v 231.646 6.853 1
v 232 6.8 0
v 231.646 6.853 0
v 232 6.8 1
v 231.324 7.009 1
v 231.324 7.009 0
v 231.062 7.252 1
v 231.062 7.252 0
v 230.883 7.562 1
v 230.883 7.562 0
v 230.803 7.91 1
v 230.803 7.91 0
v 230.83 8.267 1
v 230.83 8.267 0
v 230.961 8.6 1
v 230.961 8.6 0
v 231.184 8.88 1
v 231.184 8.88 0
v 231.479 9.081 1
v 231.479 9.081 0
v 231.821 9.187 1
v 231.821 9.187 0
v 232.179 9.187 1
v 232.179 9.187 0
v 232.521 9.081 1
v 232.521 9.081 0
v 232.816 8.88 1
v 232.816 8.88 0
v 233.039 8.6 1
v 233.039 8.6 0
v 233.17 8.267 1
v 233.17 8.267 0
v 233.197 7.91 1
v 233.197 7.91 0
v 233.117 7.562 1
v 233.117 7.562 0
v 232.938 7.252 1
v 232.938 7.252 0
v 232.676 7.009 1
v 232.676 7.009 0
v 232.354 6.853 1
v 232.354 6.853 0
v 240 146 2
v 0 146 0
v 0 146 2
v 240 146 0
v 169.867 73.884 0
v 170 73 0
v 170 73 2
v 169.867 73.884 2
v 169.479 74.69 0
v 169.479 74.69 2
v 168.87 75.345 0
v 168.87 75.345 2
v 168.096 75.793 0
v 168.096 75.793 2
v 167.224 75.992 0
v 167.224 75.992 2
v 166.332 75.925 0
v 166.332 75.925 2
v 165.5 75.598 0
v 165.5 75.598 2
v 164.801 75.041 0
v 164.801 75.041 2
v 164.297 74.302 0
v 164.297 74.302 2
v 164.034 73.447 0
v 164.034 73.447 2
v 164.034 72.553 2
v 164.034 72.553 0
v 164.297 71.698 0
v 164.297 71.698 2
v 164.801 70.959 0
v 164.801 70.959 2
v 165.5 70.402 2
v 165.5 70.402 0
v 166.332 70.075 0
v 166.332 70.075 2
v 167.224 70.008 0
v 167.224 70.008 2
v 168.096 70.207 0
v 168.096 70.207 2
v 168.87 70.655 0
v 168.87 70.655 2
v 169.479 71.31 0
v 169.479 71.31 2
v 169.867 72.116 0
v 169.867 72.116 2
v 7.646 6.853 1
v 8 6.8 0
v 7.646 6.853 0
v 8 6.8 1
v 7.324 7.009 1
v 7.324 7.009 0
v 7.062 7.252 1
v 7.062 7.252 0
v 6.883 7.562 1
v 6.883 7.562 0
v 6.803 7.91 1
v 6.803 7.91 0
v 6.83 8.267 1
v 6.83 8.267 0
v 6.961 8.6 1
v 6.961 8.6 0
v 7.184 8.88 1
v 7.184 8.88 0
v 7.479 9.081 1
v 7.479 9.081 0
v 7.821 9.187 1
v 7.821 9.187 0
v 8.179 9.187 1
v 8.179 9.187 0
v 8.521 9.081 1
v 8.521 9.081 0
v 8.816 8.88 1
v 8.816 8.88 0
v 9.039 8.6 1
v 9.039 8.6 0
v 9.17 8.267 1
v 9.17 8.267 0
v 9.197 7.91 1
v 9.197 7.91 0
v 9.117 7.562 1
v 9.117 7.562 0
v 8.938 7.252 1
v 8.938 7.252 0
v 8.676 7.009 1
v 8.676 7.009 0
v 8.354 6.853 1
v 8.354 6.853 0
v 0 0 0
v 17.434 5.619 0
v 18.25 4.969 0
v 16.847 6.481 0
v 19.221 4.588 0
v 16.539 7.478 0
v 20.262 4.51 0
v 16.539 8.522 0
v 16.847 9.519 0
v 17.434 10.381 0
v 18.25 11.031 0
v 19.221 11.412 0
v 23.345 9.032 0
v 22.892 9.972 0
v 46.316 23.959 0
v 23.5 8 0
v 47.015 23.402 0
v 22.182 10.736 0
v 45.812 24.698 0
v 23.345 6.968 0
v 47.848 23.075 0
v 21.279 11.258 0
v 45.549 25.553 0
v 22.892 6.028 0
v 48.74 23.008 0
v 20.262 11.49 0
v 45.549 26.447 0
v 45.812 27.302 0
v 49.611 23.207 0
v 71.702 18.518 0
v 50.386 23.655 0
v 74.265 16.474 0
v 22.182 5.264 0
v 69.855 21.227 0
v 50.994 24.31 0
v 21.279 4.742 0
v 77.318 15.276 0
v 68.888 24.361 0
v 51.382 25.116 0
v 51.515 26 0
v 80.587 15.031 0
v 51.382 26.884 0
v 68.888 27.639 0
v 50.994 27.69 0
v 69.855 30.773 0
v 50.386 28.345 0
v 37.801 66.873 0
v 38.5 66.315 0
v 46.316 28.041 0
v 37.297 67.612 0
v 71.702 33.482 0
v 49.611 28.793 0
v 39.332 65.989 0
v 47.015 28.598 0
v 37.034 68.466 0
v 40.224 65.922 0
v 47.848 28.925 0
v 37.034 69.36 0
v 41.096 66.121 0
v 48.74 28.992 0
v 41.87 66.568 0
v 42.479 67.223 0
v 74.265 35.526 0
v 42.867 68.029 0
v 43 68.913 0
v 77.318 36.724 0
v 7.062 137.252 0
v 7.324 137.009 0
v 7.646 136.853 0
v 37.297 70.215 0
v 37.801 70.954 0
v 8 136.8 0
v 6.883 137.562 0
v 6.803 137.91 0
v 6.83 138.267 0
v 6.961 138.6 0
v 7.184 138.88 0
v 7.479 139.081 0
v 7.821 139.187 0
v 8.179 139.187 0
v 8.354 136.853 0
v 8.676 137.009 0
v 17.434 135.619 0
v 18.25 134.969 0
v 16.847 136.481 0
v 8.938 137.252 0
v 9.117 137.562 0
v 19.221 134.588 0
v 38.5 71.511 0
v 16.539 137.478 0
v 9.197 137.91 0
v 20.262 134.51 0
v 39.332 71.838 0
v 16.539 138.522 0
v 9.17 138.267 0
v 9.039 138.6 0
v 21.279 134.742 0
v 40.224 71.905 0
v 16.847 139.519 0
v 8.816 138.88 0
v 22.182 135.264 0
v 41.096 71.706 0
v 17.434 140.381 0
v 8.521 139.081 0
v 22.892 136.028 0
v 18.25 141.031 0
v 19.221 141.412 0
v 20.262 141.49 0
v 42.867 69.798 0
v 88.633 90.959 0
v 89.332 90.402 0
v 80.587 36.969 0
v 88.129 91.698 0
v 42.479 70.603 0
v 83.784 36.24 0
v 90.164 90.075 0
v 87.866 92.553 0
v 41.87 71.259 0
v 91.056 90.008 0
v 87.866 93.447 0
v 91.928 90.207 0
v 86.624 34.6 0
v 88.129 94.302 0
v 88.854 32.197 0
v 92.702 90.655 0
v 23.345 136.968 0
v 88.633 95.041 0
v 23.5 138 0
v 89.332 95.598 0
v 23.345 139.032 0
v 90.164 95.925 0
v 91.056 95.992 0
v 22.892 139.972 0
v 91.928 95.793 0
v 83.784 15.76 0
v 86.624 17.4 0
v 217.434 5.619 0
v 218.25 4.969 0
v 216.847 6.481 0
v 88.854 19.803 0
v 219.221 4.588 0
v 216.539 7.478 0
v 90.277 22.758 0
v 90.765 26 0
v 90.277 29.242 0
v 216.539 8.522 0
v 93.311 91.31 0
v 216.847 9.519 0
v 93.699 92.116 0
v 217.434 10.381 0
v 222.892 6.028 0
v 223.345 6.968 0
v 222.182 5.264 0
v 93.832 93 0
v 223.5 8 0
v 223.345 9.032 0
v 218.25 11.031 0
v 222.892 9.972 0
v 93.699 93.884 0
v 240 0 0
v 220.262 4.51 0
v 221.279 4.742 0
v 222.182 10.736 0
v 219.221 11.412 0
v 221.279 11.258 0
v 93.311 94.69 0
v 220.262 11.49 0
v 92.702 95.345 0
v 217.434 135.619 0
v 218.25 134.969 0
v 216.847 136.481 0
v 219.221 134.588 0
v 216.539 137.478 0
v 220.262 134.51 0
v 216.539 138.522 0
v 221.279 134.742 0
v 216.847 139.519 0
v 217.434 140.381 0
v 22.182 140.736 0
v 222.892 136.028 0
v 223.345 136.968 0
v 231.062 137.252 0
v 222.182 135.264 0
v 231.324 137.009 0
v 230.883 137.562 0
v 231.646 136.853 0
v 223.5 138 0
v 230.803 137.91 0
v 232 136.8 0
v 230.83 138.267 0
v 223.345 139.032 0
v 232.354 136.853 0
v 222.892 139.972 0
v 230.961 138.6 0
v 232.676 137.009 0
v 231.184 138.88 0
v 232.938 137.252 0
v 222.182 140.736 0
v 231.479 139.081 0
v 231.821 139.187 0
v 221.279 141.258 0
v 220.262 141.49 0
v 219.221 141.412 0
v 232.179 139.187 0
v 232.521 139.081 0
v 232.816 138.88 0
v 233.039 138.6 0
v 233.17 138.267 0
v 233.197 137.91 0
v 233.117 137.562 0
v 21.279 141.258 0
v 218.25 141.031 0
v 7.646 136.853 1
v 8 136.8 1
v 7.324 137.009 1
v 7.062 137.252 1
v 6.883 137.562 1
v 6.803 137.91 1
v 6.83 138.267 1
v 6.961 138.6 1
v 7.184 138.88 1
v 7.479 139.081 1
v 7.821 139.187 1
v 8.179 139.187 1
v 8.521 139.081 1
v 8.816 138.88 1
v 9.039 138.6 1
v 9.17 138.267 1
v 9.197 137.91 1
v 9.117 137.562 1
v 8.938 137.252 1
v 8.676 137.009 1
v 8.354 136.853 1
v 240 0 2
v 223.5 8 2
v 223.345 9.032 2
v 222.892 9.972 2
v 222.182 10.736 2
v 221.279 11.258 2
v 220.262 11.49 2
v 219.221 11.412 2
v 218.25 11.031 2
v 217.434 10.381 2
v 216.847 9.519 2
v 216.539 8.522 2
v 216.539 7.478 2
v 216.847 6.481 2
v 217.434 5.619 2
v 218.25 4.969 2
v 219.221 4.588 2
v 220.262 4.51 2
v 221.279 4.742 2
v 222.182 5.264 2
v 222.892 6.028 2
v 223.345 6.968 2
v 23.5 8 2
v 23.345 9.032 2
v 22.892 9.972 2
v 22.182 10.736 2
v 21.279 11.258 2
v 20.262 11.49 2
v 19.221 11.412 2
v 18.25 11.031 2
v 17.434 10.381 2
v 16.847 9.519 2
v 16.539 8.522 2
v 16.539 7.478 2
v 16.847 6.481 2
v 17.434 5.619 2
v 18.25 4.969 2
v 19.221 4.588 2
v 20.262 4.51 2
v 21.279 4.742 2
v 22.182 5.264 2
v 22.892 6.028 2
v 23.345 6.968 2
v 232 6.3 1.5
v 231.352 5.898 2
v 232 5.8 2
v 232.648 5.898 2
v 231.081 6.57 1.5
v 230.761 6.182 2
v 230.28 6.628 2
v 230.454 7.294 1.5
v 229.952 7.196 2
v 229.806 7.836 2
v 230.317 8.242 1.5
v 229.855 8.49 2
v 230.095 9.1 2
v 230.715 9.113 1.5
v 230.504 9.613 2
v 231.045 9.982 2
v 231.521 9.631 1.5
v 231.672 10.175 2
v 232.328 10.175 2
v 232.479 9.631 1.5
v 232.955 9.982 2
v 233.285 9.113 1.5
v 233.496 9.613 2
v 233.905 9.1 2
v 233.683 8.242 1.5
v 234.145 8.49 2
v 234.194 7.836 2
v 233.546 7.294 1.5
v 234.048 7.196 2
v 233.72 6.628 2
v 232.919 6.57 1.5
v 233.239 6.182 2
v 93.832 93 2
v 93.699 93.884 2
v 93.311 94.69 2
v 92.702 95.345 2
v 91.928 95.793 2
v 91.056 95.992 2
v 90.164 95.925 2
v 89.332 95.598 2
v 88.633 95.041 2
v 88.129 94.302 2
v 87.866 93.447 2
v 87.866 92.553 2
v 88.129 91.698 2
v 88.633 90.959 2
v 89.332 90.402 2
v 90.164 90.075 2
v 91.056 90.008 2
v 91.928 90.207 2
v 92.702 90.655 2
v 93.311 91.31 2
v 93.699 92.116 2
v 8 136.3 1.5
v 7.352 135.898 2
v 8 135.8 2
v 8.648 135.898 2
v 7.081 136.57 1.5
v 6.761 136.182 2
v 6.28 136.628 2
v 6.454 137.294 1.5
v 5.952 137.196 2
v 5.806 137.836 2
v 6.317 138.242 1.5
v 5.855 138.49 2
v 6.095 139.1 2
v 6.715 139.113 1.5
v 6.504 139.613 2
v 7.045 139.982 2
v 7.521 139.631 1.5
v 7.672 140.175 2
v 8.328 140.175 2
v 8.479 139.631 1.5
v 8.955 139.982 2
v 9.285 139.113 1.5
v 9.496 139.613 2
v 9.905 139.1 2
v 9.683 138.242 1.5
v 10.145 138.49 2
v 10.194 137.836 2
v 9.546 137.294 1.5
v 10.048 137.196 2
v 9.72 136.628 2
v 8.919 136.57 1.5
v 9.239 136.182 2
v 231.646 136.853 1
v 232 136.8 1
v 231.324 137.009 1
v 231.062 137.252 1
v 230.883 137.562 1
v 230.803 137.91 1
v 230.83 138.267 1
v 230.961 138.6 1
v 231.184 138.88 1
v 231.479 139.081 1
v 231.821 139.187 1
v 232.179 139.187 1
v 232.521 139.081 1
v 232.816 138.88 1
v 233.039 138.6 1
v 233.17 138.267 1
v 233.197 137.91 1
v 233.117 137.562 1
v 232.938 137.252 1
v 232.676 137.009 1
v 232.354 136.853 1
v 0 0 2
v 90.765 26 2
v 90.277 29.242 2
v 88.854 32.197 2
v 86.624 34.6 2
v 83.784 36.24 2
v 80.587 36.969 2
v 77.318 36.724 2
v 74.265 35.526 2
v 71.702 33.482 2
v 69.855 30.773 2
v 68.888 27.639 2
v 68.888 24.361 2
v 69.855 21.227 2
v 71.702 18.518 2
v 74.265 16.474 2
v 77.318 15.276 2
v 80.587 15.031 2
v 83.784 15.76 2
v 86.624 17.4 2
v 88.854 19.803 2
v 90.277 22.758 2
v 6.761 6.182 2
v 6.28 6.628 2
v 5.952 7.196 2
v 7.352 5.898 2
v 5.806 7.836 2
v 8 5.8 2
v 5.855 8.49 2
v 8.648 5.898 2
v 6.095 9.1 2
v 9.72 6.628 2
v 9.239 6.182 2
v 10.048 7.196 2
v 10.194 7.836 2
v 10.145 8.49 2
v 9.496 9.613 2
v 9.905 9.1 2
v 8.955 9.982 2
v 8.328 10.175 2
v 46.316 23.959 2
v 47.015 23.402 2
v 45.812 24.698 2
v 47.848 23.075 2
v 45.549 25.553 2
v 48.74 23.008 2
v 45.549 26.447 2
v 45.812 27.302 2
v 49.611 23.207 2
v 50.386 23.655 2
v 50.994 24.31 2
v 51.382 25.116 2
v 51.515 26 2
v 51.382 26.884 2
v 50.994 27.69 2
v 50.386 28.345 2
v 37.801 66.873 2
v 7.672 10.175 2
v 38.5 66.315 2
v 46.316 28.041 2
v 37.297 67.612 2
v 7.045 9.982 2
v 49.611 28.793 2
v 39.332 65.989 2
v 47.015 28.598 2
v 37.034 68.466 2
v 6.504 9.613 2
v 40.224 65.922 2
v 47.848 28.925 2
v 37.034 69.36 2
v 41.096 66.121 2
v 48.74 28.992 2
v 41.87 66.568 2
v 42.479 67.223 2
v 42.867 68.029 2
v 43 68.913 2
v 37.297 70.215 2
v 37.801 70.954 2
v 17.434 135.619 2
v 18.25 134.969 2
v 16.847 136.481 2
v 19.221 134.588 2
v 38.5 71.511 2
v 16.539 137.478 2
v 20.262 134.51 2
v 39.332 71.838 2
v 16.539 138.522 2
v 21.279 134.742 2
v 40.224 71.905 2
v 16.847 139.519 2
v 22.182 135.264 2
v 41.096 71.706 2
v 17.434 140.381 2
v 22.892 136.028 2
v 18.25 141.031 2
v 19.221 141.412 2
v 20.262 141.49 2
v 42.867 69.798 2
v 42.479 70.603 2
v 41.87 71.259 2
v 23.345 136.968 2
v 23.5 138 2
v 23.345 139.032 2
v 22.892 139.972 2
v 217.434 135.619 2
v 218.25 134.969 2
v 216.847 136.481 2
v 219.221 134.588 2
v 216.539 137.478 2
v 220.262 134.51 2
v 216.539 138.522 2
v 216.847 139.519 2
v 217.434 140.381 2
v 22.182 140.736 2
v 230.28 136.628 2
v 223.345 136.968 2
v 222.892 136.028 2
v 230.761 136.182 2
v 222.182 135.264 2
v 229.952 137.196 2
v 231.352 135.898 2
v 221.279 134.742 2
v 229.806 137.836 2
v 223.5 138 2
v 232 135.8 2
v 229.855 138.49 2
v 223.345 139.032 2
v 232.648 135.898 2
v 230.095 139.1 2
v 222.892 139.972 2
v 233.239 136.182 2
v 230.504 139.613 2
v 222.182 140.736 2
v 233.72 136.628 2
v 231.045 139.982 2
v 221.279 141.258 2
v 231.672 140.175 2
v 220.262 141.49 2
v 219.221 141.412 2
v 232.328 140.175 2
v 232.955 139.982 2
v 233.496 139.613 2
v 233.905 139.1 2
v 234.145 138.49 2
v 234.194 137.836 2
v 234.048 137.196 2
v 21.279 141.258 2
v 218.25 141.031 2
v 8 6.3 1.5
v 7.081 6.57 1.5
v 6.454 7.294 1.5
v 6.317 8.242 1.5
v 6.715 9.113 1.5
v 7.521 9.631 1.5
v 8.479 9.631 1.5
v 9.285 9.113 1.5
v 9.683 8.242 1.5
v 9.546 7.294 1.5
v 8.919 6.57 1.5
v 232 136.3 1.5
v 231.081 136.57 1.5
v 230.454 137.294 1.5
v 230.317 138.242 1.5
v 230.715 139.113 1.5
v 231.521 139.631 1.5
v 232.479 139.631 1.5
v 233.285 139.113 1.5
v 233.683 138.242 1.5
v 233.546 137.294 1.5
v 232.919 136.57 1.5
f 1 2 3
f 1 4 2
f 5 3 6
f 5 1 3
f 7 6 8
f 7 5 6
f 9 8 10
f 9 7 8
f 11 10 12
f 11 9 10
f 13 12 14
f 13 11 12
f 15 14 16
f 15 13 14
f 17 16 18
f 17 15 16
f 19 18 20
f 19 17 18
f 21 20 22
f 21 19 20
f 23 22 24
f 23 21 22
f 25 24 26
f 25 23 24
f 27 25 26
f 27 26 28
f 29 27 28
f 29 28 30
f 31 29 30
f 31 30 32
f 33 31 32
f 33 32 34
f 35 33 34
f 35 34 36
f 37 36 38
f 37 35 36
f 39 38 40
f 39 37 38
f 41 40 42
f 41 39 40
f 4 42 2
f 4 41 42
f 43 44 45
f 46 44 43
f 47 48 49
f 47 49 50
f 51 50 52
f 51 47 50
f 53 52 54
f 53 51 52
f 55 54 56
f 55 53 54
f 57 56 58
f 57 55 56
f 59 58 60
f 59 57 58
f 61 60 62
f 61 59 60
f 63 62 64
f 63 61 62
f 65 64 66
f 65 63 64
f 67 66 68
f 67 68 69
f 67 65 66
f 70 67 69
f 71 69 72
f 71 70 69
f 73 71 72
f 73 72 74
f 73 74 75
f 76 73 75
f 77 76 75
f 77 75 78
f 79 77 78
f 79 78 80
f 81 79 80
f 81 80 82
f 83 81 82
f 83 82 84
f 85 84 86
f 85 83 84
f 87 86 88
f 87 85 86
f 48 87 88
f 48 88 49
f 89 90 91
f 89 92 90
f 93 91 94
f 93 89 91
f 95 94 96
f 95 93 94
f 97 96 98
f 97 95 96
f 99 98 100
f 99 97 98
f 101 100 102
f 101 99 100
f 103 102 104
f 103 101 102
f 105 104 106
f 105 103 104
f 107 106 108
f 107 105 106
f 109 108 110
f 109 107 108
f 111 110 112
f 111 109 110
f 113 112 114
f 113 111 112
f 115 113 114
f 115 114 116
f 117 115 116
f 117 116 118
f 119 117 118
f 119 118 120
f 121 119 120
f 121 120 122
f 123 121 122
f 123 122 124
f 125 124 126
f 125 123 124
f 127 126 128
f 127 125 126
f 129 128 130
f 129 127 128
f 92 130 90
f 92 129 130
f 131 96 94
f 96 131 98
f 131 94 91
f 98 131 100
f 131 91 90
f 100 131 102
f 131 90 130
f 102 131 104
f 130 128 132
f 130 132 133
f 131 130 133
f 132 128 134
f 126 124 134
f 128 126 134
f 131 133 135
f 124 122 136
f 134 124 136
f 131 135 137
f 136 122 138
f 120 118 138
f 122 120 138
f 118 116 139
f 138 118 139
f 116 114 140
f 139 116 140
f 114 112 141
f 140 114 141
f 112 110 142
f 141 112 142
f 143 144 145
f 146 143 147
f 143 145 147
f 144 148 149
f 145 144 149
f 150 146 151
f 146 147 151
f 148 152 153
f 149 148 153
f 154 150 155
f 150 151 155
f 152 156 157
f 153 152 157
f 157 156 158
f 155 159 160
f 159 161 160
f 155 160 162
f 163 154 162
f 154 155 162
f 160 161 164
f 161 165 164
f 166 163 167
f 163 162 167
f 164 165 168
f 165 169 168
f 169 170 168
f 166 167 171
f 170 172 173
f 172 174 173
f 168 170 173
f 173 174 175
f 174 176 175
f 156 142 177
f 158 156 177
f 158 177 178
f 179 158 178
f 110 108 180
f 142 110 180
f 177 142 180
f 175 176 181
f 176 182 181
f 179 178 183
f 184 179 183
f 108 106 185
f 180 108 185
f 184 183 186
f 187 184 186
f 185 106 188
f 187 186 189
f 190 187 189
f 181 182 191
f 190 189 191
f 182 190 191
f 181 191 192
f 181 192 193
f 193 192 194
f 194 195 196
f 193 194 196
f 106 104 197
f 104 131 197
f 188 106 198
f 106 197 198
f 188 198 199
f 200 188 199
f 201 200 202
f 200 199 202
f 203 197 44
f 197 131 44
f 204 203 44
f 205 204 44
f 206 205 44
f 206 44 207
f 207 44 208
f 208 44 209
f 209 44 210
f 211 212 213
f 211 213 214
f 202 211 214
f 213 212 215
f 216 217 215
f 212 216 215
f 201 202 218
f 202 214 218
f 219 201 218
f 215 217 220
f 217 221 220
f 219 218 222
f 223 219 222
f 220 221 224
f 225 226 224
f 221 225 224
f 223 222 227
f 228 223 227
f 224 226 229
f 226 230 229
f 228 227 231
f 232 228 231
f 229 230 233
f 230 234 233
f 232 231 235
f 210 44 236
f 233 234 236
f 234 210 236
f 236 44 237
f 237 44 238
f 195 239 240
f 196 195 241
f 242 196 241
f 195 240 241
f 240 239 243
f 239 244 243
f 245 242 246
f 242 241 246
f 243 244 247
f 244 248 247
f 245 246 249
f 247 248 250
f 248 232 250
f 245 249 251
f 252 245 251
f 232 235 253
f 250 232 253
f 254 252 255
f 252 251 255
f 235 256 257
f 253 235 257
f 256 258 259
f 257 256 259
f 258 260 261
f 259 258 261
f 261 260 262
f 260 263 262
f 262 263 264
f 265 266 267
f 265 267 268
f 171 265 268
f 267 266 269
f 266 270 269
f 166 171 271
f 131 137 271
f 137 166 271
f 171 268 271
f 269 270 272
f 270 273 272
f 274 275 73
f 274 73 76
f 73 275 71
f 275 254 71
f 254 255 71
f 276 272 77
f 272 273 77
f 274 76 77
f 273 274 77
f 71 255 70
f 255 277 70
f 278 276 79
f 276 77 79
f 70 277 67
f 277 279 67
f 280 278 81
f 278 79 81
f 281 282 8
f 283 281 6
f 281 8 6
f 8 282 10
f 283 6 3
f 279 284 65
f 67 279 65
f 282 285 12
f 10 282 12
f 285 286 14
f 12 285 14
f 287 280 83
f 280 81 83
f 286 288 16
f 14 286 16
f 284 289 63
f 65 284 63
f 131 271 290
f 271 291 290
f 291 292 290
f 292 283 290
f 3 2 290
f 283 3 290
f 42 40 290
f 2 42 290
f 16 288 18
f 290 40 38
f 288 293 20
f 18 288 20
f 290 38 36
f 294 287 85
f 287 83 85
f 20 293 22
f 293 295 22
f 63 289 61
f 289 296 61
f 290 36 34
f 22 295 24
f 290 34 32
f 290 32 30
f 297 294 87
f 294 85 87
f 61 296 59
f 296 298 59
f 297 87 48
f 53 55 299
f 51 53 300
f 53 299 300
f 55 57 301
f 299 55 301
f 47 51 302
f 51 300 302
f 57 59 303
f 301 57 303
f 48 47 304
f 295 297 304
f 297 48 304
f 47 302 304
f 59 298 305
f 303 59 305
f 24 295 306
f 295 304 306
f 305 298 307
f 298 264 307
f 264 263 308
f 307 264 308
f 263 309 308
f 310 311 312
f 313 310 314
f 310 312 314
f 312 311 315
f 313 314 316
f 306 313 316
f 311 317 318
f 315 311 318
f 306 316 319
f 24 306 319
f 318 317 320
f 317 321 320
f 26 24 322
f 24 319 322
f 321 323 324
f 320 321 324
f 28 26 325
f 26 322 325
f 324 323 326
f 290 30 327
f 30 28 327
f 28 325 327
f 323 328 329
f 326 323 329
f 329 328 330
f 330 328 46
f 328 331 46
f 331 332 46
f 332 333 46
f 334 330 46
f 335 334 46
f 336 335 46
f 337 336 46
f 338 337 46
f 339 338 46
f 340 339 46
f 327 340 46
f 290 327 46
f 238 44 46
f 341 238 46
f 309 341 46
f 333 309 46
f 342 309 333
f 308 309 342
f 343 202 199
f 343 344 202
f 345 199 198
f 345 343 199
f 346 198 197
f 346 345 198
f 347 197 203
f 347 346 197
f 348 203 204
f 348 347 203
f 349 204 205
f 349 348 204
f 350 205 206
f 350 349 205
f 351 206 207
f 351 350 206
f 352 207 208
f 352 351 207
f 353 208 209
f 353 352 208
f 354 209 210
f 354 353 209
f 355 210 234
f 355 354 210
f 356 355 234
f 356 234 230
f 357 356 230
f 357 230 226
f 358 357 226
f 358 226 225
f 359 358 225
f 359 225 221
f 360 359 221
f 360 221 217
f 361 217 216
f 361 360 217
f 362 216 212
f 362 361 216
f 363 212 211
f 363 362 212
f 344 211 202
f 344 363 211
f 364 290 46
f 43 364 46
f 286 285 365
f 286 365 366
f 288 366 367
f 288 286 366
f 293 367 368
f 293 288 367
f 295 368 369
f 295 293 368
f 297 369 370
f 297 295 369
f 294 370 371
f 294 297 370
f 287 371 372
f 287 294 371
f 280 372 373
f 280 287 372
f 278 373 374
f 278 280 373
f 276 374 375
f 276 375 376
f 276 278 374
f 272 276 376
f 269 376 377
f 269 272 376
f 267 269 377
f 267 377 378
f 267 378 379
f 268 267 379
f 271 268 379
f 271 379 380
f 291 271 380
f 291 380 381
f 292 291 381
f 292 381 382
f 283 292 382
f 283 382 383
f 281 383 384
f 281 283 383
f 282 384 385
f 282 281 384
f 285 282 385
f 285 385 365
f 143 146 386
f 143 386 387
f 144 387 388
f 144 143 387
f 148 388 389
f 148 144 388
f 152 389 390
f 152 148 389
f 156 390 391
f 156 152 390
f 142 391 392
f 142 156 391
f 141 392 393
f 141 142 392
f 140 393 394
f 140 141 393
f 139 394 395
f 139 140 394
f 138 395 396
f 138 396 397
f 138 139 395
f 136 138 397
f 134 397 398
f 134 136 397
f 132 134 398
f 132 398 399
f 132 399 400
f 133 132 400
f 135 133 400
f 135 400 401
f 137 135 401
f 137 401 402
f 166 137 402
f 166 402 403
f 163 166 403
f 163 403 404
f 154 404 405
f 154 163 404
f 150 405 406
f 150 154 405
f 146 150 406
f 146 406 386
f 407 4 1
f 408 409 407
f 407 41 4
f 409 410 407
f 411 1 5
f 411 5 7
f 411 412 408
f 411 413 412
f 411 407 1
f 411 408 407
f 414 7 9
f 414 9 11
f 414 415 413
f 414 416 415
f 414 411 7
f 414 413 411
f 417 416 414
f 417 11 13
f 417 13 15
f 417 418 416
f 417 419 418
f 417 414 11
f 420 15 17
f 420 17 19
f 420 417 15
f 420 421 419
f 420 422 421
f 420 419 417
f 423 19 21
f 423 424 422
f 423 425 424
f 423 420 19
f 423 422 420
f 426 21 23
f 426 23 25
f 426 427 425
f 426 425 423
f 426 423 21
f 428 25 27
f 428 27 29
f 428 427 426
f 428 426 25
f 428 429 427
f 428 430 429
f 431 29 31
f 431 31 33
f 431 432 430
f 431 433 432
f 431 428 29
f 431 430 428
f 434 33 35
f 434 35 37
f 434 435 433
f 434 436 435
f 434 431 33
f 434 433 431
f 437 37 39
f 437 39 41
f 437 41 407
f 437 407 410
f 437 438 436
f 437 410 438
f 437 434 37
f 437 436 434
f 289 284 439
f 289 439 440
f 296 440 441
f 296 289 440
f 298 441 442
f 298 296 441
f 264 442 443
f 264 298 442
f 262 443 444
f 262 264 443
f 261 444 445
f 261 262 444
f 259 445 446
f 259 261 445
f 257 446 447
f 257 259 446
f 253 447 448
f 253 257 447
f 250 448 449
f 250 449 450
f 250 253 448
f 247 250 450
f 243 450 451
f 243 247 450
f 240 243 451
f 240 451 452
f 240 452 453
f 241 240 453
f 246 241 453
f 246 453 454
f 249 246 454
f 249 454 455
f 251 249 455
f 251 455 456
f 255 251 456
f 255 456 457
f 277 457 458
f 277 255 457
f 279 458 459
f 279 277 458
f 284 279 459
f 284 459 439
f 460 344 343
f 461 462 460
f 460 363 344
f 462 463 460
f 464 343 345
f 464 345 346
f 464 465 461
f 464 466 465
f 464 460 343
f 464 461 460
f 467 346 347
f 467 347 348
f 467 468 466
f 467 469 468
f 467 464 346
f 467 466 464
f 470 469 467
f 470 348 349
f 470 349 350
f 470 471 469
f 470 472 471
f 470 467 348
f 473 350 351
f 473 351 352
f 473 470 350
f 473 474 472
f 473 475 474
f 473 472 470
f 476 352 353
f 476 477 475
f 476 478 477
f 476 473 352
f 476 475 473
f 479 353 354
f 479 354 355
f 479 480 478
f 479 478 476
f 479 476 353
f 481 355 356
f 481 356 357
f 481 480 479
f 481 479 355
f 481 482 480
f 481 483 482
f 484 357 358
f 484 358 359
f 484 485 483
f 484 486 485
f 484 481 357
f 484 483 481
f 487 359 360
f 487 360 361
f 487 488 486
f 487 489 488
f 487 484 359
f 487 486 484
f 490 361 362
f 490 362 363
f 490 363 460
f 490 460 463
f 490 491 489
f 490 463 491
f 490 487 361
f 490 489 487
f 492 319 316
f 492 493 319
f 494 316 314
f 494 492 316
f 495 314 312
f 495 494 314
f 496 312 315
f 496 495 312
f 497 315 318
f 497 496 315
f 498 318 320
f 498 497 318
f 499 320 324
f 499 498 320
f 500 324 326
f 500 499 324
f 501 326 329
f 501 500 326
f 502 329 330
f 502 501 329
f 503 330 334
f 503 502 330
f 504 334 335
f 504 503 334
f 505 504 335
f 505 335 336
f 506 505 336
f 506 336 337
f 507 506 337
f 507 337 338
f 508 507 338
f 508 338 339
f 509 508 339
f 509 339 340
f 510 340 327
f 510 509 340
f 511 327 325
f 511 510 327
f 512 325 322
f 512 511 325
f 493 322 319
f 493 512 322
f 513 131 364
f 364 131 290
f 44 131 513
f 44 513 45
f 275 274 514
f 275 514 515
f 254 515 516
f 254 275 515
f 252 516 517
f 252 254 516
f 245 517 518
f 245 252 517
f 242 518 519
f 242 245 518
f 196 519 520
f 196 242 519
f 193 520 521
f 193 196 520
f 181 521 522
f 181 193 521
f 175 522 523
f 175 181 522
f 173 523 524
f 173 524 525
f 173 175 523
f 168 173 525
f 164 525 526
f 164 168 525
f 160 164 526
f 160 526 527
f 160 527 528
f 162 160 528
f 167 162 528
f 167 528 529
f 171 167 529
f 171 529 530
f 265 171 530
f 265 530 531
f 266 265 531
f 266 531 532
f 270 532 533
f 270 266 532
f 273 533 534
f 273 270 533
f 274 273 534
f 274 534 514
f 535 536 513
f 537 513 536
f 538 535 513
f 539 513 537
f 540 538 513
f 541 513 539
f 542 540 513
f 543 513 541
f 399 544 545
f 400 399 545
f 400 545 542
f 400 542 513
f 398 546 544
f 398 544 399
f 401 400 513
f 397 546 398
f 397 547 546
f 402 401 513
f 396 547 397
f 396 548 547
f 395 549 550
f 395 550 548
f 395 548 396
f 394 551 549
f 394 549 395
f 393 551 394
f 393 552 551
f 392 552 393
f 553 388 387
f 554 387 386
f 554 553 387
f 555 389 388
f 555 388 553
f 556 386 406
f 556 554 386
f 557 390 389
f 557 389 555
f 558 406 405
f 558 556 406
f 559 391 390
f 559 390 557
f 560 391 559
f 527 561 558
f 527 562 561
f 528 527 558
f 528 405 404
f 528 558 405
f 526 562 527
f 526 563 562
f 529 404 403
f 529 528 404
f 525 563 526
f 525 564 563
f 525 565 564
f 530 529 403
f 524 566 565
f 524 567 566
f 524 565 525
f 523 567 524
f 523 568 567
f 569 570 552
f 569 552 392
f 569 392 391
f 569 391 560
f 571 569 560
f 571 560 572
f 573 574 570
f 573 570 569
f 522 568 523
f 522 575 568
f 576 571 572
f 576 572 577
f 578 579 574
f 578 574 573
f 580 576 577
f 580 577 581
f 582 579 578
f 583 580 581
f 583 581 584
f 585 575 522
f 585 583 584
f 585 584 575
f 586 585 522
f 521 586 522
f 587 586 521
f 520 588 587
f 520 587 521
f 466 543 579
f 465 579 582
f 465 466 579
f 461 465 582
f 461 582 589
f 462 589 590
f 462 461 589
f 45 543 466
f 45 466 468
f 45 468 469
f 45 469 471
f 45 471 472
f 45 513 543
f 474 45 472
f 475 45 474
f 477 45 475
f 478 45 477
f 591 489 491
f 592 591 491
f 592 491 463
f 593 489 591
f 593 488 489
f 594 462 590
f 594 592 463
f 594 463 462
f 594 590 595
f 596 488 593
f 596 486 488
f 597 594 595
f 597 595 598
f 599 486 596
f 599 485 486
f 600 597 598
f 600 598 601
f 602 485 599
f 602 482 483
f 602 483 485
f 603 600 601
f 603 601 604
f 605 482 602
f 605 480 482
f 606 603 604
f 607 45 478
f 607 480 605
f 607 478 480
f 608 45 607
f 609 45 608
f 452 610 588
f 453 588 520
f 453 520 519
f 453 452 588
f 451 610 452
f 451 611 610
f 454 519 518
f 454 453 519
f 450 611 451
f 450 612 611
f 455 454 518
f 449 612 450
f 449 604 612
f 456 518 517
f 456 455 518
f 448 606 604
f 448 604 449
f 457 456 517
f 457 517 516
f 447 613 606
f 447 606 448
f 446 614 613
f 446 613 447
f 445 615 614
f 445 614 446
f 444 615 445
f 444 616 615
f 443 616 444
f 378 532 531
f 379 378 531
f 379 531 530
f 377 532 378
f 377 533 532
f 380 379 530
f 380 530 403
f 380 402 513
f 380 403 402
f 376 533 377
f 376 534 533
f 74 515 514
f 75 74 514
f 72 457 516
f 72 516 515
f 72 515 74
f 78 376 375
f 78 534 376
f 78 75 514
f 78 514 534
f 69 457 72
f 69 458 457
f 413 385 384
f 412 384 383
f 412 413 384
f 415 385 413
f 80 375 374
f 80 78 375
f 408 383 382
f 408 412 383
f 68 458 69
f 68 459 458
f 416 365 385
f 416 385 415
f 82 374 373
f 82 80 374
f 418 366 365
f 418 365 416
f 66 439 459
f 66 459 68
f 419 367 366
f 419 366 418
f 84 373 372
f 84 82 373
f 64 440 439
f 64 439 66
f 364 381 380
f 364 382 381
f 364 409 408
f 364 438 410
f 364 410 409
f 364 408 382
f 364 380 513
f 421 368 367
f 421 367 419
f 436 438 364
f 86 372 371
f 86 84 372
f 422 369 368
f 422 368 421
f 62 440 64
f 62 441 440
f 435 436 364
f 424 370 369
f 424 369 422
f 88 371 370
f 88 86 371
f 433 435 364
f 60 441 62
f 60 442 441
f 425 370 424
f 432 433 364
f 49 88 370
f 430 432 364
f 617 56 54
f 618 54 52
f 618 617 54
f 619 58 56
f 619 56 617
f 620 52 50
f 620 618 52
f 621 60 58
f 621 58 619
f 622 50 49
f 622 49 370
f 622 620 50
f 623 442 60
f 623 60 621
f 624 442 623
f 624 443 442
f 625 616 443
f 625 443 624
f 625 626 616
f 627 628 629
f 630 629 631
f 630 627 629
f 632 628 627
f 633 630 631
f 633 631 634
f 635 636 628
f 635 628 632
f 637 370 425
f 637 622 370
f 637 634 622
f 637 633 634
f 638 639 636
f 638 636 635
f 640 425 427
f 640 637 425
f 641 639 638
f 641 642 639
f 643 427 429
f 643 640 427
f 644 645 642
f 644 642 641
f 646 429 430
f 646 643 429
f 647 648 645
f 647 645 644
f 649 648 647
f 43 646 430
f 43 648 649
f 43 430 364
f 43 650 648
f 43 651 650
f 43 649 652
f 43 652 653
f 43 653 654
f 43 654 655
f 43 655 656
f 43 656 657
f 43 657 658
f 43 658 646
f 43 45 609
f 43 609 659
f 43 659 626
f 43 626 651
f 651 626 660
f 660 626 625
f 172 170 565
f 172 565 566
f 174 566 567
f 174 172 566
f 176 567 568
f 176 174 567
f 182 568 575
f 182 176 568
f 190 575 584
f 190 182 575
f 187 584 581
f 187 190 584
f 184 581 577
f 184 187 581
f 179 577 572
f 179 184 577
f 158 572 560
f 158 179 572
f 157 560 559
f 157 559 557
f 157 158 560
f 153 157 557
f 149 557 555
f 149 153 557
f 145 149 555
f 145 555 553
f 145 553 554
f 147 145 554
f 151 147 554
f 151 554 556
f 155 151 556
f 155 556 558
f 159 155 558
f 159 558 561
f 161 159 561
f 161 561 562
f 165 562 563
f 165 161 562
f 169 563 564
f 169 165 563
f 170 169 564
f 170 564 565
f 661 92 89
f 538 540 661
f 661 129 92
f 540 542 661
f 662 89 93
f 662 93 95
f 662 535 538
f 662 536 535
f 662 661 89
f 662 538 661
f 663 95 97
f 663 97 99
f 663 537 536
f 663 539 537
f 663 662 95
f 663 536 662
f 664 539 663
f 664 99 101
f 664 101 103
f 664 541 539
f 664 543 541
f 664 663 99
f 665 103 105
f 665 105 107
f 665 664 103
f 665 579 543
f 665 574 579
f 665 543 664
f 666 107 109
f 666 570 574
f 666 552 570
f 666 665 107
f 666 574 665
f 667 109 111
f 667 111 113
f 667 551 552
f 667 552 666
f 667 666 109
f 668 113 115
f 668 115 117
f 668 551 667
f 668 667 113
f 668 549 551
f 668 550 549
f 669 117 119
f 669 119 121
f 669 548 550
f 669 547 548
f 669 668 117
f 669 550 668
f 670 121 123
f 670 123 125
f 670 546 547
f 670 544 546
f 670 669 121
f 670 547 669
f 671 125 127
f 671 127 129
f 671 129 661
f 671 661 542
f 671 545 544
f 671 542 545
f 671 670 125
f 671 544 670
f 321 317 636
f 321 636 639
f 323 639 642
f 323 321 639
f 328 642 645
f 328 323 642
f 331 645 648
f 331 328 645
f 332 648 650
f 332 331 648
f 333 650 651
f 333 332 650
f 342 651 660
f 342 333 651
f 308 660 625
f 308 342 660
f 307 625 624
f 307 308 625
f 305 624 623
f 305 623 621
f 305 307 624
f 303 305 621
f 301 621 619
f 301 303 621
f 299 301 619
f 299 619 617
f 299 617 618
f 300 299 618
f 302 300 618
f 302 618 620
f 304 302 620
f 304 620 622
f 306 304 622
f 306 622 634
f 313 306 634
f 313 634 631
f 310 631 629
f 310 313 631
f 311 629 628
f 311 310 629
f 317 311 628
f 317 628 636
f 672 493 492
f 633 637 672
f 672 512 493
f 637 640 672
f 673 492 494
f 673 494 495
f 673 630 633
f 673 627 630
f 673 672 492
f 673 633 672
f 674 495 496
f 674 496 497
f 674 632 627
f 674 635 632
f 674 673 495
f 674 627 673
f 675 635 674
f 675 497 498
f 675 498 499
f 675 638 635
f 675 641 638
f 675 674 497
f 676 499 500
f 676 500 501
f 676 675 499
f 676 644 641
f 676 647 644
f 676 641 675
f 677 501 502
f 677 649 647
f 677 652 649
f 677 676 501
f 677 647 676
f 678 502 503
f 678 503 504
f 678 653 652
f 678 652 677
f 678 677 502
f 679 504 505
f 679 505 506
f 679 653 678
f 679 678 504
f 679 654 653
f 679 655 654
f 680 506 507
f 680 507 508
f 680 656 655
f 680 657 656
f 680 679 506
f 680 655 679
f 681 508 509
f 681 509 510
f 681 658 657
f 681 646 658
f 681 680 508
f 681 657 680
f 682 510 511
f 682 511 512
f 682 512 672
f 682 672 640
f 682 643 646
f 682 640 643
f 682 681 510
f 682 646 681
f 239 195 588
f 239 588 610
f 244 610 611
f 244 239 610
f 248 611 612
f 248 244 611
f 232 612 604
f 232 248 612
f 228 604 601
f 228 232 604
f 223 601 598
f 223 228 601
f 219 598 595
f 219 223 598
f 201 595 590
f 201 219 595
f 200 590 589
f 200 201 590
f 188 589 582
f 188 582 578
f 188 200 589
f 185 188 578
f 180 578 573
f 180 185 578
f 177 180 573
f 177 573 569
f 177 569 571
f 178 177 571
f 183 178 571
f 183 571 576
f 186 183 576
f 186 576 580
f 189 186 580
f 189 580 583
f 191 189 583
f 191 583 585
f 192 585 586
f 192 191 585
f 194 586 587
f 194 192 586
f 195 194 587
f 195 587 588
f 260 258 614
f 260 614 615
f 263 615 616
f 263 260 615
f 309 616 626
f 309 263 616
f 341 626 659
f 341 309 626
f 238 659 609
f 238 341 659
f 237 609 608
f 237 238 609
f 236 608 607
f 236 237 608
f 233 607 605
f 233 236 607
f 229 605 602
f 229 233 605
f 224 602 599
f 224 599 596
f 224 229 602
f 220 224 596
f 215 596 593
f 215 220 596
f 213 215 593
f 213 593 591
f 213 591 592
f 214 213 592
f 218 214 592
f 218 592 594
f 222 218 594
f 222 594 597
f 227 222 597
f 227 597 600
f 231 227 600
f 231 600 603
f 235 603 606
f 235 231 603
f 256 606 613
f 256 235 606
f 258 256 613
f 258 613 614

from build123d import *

# Parameters (mm, degrees)
SKETCH_1_W                 = 240
SKETCH_1_H                 = 146
SKETCH_1_R                 = 11
SKETCH_1_R_2               = 3
SKETCH_1_R_3               = 3.5
EXTRUDE_1_DEPTH            = 2
HOLE_WIZARD_M22_AT_2_COUNT = 2
HOLE_WIZARD_M22_AT_2_PITCH = 224
HOLE_WIZARD_M22_AT_3_COUNT = 2
HOLE_WIZARD_M22_AT_3_PITCH = 258.99034731
HOLE_WIZARD_M22_AT_4_COUNT = 2
HOLE_WIZARD_M22_AT_4_PITCH = 130


with BuildPart() as part:
    # Эскиз1 → Бобышка-Вытянуть1 (new body)
    with BuildSketch(Plane.XY):
        with Locations((120, 73)):
            Rectangle(SKETCH_1_W, SKETCH_1_H)
        with Locations((79.765350749, 26)):
            Circle(SKETCH_1_R, mode=Mode.SUBTRACT)
        with Locations((48.515350749, 26)):
            Circle(SKETCH_1_R_2, mode=Mode.SUBTRACT)
        with Locations((167, 73)):
            Circle(SKETCH_1_R_2, mode=Mode.SUBTRACT)
        with Locations((90.832011317, 93)):
            Circle(SKETCH_1_R_2, mode=Mode.SUBTRACT)
        with Locations((40, 68.913299822)):
            Circle(SKETCH_1_R_2, mode=Mode.SUBTRACT)
        with Locations((20, 138)):
            Circle(SKETCH_1_R_3, mode=Mode.SUBTRACT)
        with Locations((220, 138)):
            Circle(SKETCH_1_R_3, mode=Mode.SUBTRACT)
        with Locations((220, 8)):
            Circle(SKETCH_1_R_3, mode=Mode.SUBTRACT)
        with Locations((20, 8)):
            Circle(SKETCH_1_R_3, mode=Mode.SUBTRACT)
    extrude(amount=EXTRUDE_1_DEPTH)

    # Эскиз7 → Зенковка для винта с полупотайной головкой M22 (revolve, cut)
    with BuildSketch(Plane(origin=(8, 138, 2), x_dir=(0, -1, 0), z_dir=(1, 0, 0))):
        Polygon((0, 0), (0, 2), (1.2, 2), (1.2, 1), (2.2, 0), align=None)
    hole_wizard_m22 = revolve(axis=Axis((8, 138, 8.35), (0, 0, -1)), mode=Mode.SUBTRACT)

    # Зенковка для винта с полупотайной головкой M22 at 2: Зенковка для винта с полупотайной головкой M22 ×2
    with Locations(*[(i * HOLE_WIZARD_M22_AT_2_PITCH, 0, 0) for i in range(1, HOLE_WIZARD_M22_AT_2_COUNT)]):
        add(hole_wizard_m22, mode=Mode.SUBTRACT)

    # Зенковка для винта с полупотайной головкой M22 at 3: Зенковка для винта с полупотайной головкой M22 ×2
    with Locations(*[Vector(0.864897099, -0.501949209, 0) * (i * HOLE_WIZARD_M22_AT_3_PITCH) for i in range(1, HOLE_WIZARD_M22_AT_3_COUNT)]):
        add(hole_wizard_m22, mode=Mode.SUBTRACT)

    # Зенковка для винта с полупотайной головкой M22 at 4: Зенковка для винта с полупотайной головкой M22 ×2
    with Locations(*[(0, -i * HOLE_WIZARD_M22_AT_4_PITCH, 0) for i in range(1, HOLE_WIZARD_M22_AT_4_COUNT)]):
        add(hole_wizard_m22, mode=Mode.SUBTRACT)


solid = part.part
